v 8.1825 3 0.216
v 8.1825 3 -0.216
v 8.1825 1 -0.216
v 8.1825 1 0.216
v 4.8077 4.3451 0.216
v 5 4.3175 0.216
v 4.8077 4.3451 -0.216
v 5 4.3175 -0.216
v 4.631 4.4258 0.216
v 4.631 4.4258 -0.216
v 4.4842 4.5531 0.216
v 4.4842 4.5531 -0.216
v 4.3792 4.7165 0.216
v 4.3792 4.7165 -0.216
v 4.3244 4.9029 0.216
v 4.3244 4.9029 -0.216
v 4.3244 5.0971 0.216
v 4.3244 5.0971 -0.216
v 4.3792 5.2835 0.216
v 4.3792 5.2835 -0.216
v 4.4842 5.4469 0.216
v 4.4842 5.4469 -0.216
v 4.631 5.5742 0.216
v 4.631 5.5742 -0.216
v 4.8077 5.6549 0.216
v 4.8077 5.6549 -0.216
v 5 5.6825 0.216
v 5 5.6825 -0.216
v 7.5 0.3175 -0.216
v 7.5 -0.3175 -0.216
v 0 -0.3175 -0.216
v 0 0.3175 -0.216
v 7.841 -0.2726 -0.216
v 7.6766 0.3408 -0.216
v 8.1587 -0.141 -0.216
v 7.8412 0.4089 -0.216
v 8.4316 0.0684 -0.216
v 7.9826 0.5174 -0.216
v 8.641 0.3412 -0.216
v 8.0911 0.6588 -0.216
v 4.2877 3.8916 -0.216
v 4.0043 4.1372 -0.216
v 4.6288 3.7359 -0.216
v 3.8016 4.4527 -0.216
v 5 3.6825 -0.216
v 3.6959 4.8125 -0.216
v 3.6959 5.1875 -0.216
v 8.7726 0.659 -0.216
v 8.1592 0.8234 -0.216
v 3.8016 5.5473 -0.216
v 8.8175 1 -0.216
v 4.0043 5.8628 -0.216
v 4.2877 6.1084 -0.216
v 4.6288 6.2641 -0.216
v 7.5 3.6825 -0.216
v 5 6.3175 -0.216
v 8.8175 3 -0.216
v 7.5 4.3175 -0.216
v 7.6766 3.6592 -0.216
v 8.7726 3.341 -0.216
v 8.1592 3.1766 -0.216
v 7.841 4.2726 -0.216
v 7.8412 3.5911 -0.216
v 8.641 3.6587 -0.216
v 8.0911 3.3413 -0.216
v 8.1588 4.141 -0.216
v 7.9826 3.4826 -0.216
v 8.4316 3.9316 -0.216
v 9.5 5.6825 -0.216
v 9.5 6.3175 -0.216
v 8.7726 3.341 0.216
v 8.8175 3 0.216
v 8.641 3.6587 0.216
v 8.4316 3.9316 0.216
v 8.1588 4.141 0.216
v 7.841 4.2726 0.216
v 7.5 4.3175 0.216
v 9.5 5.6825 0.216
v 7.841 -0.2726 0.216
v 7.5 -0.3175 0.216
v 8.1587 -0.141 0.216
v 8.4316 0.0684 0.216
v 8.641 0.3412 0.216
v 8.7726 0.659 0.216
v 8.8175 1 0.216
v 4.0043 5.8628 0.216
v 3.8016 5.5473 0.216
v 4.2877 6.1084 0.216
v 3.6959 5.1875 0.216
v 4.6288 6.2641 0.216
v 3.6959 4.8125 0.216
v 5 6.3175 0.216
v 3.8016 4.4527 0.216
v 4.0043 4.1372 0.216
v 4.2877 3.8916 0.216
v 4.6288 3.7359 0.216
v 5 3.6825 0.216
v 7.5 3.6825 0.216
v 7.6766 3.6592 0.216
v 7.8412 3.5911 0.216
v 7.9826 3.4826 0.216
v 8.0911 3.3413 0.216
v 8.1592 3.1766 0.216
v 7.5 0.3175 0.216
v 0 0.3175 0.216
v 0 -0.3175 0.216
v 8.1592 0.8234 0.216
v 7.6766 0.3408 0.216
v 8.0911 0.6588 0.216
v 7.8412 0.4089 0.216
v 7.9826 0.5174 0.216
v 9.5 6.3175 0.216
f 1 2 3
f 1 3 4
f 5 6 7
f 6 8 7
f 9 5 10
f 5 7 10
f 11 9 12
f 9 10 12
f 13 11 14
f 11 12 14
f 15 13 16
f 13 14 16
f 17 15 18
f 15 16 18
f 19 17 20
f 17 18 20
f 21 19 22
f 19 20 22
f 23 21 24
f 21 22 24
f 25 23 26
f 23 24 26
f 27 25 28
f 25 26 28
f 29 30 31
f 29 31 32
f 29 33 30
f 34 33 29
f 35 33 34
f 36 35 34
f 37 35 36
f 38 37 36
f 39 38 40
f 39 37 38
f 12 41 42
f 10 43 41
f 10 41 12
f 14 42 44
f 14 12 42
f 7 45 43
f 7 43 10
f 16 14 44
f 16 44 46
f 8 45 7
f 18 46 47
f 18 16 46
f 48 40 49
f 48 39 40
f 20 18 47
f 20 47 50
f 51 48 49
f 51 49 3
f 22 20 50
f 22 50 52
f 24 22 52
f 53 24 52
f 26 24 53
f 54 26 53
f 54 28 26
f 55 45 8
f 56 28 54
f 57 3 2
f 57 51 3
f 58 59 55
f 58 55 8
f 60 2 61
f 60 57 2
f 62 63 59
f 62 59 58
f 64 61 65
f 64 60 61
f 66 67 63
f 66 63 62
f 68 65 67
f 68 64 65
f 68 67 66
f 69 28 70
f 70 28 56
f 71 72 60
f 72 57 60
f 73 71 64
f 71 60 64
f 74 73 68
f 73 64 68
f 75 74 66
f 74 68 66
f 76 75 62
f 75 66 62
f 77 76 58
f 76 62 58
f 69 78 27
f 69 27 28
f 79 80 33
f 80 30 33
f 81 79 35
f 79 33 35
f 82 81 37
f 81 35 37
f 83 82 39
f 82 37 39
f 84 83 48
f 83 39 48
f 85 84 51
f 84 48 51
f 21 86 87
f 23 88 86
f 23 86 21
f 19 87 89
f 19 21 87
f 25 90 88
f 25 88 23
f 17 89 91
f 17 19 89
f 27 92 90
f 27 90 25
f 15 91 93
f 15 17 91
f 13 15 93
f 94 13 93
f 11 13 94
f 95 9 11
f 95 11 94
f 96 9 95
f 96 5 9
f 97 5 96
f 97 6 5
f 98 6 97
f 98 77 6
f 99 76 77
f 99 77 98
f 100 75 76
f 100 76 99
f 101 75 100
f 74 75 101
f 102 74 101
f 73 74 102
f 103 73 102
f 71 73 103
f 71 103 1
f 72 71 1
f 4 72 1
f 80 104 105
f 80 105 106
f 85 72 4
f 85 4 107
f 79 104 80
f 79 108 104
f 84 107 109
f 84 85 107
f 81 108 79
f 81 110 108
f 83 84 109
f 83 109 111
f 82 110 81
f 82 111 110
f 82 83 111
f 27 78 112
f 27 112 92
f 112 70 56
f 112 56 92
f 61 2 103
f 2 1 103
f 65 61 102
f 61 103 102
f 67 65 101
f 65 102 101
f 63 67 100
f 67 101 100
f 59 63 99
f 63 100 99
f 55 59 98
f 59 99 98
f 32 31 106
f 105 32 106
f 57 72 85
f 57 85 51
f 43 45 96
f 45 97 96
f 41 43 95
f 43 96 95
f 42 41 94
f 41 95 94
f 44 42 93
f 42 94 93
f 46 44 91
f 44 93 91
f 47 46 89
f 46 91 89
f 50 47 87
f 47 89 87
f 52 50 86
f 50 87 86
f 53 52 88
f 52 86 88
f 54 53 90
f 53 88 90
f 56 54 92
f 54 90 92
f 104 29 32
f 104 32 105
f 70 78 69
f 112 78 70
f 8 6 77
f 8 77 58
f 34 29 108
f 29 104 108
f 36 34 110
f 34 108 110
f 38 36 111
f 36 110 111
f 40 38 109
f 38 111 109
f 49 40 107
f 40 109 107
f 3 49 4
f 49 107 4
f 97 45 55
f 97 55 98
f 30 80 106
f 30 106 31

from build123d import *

# Parameters (mm, degrees)
SKETCH2_W = 0.432
SKETCH2_H = 0.635


with BuildPart() as part:
    # Sweep1: sweep along a path in Sketch1
    with BuildLine(Plane.XY) as sweep1_path:
        Line((0, 0), (7.5, 0))
        ThreePointArc((7.5, 0), (8.207106781, 0.292893219), (8.5, 1))
        Line((8.5, 1), (8.5, 3))
        ThreePointArc((8.5, 3), (8.207106781, 3.707106781), (7.5, 4))
        Line((7.5, 4), (5, 4))
        ThreePointArc((5, 4), (4, 5), (5, 6))
        Line((5, 6), (9.5, 6))
    # Sketch2 → Sweep1 (sweep)
    with BuildSketch(Plane(origin=(0, 0, 0), x_dir=(0, 0, -1), z_dir=(1, 0, 0))):
        Rectangle(SKETCH2_W, SKETCH2_H)
    sweep(path=sweep1_path.line)


solid = part.part
